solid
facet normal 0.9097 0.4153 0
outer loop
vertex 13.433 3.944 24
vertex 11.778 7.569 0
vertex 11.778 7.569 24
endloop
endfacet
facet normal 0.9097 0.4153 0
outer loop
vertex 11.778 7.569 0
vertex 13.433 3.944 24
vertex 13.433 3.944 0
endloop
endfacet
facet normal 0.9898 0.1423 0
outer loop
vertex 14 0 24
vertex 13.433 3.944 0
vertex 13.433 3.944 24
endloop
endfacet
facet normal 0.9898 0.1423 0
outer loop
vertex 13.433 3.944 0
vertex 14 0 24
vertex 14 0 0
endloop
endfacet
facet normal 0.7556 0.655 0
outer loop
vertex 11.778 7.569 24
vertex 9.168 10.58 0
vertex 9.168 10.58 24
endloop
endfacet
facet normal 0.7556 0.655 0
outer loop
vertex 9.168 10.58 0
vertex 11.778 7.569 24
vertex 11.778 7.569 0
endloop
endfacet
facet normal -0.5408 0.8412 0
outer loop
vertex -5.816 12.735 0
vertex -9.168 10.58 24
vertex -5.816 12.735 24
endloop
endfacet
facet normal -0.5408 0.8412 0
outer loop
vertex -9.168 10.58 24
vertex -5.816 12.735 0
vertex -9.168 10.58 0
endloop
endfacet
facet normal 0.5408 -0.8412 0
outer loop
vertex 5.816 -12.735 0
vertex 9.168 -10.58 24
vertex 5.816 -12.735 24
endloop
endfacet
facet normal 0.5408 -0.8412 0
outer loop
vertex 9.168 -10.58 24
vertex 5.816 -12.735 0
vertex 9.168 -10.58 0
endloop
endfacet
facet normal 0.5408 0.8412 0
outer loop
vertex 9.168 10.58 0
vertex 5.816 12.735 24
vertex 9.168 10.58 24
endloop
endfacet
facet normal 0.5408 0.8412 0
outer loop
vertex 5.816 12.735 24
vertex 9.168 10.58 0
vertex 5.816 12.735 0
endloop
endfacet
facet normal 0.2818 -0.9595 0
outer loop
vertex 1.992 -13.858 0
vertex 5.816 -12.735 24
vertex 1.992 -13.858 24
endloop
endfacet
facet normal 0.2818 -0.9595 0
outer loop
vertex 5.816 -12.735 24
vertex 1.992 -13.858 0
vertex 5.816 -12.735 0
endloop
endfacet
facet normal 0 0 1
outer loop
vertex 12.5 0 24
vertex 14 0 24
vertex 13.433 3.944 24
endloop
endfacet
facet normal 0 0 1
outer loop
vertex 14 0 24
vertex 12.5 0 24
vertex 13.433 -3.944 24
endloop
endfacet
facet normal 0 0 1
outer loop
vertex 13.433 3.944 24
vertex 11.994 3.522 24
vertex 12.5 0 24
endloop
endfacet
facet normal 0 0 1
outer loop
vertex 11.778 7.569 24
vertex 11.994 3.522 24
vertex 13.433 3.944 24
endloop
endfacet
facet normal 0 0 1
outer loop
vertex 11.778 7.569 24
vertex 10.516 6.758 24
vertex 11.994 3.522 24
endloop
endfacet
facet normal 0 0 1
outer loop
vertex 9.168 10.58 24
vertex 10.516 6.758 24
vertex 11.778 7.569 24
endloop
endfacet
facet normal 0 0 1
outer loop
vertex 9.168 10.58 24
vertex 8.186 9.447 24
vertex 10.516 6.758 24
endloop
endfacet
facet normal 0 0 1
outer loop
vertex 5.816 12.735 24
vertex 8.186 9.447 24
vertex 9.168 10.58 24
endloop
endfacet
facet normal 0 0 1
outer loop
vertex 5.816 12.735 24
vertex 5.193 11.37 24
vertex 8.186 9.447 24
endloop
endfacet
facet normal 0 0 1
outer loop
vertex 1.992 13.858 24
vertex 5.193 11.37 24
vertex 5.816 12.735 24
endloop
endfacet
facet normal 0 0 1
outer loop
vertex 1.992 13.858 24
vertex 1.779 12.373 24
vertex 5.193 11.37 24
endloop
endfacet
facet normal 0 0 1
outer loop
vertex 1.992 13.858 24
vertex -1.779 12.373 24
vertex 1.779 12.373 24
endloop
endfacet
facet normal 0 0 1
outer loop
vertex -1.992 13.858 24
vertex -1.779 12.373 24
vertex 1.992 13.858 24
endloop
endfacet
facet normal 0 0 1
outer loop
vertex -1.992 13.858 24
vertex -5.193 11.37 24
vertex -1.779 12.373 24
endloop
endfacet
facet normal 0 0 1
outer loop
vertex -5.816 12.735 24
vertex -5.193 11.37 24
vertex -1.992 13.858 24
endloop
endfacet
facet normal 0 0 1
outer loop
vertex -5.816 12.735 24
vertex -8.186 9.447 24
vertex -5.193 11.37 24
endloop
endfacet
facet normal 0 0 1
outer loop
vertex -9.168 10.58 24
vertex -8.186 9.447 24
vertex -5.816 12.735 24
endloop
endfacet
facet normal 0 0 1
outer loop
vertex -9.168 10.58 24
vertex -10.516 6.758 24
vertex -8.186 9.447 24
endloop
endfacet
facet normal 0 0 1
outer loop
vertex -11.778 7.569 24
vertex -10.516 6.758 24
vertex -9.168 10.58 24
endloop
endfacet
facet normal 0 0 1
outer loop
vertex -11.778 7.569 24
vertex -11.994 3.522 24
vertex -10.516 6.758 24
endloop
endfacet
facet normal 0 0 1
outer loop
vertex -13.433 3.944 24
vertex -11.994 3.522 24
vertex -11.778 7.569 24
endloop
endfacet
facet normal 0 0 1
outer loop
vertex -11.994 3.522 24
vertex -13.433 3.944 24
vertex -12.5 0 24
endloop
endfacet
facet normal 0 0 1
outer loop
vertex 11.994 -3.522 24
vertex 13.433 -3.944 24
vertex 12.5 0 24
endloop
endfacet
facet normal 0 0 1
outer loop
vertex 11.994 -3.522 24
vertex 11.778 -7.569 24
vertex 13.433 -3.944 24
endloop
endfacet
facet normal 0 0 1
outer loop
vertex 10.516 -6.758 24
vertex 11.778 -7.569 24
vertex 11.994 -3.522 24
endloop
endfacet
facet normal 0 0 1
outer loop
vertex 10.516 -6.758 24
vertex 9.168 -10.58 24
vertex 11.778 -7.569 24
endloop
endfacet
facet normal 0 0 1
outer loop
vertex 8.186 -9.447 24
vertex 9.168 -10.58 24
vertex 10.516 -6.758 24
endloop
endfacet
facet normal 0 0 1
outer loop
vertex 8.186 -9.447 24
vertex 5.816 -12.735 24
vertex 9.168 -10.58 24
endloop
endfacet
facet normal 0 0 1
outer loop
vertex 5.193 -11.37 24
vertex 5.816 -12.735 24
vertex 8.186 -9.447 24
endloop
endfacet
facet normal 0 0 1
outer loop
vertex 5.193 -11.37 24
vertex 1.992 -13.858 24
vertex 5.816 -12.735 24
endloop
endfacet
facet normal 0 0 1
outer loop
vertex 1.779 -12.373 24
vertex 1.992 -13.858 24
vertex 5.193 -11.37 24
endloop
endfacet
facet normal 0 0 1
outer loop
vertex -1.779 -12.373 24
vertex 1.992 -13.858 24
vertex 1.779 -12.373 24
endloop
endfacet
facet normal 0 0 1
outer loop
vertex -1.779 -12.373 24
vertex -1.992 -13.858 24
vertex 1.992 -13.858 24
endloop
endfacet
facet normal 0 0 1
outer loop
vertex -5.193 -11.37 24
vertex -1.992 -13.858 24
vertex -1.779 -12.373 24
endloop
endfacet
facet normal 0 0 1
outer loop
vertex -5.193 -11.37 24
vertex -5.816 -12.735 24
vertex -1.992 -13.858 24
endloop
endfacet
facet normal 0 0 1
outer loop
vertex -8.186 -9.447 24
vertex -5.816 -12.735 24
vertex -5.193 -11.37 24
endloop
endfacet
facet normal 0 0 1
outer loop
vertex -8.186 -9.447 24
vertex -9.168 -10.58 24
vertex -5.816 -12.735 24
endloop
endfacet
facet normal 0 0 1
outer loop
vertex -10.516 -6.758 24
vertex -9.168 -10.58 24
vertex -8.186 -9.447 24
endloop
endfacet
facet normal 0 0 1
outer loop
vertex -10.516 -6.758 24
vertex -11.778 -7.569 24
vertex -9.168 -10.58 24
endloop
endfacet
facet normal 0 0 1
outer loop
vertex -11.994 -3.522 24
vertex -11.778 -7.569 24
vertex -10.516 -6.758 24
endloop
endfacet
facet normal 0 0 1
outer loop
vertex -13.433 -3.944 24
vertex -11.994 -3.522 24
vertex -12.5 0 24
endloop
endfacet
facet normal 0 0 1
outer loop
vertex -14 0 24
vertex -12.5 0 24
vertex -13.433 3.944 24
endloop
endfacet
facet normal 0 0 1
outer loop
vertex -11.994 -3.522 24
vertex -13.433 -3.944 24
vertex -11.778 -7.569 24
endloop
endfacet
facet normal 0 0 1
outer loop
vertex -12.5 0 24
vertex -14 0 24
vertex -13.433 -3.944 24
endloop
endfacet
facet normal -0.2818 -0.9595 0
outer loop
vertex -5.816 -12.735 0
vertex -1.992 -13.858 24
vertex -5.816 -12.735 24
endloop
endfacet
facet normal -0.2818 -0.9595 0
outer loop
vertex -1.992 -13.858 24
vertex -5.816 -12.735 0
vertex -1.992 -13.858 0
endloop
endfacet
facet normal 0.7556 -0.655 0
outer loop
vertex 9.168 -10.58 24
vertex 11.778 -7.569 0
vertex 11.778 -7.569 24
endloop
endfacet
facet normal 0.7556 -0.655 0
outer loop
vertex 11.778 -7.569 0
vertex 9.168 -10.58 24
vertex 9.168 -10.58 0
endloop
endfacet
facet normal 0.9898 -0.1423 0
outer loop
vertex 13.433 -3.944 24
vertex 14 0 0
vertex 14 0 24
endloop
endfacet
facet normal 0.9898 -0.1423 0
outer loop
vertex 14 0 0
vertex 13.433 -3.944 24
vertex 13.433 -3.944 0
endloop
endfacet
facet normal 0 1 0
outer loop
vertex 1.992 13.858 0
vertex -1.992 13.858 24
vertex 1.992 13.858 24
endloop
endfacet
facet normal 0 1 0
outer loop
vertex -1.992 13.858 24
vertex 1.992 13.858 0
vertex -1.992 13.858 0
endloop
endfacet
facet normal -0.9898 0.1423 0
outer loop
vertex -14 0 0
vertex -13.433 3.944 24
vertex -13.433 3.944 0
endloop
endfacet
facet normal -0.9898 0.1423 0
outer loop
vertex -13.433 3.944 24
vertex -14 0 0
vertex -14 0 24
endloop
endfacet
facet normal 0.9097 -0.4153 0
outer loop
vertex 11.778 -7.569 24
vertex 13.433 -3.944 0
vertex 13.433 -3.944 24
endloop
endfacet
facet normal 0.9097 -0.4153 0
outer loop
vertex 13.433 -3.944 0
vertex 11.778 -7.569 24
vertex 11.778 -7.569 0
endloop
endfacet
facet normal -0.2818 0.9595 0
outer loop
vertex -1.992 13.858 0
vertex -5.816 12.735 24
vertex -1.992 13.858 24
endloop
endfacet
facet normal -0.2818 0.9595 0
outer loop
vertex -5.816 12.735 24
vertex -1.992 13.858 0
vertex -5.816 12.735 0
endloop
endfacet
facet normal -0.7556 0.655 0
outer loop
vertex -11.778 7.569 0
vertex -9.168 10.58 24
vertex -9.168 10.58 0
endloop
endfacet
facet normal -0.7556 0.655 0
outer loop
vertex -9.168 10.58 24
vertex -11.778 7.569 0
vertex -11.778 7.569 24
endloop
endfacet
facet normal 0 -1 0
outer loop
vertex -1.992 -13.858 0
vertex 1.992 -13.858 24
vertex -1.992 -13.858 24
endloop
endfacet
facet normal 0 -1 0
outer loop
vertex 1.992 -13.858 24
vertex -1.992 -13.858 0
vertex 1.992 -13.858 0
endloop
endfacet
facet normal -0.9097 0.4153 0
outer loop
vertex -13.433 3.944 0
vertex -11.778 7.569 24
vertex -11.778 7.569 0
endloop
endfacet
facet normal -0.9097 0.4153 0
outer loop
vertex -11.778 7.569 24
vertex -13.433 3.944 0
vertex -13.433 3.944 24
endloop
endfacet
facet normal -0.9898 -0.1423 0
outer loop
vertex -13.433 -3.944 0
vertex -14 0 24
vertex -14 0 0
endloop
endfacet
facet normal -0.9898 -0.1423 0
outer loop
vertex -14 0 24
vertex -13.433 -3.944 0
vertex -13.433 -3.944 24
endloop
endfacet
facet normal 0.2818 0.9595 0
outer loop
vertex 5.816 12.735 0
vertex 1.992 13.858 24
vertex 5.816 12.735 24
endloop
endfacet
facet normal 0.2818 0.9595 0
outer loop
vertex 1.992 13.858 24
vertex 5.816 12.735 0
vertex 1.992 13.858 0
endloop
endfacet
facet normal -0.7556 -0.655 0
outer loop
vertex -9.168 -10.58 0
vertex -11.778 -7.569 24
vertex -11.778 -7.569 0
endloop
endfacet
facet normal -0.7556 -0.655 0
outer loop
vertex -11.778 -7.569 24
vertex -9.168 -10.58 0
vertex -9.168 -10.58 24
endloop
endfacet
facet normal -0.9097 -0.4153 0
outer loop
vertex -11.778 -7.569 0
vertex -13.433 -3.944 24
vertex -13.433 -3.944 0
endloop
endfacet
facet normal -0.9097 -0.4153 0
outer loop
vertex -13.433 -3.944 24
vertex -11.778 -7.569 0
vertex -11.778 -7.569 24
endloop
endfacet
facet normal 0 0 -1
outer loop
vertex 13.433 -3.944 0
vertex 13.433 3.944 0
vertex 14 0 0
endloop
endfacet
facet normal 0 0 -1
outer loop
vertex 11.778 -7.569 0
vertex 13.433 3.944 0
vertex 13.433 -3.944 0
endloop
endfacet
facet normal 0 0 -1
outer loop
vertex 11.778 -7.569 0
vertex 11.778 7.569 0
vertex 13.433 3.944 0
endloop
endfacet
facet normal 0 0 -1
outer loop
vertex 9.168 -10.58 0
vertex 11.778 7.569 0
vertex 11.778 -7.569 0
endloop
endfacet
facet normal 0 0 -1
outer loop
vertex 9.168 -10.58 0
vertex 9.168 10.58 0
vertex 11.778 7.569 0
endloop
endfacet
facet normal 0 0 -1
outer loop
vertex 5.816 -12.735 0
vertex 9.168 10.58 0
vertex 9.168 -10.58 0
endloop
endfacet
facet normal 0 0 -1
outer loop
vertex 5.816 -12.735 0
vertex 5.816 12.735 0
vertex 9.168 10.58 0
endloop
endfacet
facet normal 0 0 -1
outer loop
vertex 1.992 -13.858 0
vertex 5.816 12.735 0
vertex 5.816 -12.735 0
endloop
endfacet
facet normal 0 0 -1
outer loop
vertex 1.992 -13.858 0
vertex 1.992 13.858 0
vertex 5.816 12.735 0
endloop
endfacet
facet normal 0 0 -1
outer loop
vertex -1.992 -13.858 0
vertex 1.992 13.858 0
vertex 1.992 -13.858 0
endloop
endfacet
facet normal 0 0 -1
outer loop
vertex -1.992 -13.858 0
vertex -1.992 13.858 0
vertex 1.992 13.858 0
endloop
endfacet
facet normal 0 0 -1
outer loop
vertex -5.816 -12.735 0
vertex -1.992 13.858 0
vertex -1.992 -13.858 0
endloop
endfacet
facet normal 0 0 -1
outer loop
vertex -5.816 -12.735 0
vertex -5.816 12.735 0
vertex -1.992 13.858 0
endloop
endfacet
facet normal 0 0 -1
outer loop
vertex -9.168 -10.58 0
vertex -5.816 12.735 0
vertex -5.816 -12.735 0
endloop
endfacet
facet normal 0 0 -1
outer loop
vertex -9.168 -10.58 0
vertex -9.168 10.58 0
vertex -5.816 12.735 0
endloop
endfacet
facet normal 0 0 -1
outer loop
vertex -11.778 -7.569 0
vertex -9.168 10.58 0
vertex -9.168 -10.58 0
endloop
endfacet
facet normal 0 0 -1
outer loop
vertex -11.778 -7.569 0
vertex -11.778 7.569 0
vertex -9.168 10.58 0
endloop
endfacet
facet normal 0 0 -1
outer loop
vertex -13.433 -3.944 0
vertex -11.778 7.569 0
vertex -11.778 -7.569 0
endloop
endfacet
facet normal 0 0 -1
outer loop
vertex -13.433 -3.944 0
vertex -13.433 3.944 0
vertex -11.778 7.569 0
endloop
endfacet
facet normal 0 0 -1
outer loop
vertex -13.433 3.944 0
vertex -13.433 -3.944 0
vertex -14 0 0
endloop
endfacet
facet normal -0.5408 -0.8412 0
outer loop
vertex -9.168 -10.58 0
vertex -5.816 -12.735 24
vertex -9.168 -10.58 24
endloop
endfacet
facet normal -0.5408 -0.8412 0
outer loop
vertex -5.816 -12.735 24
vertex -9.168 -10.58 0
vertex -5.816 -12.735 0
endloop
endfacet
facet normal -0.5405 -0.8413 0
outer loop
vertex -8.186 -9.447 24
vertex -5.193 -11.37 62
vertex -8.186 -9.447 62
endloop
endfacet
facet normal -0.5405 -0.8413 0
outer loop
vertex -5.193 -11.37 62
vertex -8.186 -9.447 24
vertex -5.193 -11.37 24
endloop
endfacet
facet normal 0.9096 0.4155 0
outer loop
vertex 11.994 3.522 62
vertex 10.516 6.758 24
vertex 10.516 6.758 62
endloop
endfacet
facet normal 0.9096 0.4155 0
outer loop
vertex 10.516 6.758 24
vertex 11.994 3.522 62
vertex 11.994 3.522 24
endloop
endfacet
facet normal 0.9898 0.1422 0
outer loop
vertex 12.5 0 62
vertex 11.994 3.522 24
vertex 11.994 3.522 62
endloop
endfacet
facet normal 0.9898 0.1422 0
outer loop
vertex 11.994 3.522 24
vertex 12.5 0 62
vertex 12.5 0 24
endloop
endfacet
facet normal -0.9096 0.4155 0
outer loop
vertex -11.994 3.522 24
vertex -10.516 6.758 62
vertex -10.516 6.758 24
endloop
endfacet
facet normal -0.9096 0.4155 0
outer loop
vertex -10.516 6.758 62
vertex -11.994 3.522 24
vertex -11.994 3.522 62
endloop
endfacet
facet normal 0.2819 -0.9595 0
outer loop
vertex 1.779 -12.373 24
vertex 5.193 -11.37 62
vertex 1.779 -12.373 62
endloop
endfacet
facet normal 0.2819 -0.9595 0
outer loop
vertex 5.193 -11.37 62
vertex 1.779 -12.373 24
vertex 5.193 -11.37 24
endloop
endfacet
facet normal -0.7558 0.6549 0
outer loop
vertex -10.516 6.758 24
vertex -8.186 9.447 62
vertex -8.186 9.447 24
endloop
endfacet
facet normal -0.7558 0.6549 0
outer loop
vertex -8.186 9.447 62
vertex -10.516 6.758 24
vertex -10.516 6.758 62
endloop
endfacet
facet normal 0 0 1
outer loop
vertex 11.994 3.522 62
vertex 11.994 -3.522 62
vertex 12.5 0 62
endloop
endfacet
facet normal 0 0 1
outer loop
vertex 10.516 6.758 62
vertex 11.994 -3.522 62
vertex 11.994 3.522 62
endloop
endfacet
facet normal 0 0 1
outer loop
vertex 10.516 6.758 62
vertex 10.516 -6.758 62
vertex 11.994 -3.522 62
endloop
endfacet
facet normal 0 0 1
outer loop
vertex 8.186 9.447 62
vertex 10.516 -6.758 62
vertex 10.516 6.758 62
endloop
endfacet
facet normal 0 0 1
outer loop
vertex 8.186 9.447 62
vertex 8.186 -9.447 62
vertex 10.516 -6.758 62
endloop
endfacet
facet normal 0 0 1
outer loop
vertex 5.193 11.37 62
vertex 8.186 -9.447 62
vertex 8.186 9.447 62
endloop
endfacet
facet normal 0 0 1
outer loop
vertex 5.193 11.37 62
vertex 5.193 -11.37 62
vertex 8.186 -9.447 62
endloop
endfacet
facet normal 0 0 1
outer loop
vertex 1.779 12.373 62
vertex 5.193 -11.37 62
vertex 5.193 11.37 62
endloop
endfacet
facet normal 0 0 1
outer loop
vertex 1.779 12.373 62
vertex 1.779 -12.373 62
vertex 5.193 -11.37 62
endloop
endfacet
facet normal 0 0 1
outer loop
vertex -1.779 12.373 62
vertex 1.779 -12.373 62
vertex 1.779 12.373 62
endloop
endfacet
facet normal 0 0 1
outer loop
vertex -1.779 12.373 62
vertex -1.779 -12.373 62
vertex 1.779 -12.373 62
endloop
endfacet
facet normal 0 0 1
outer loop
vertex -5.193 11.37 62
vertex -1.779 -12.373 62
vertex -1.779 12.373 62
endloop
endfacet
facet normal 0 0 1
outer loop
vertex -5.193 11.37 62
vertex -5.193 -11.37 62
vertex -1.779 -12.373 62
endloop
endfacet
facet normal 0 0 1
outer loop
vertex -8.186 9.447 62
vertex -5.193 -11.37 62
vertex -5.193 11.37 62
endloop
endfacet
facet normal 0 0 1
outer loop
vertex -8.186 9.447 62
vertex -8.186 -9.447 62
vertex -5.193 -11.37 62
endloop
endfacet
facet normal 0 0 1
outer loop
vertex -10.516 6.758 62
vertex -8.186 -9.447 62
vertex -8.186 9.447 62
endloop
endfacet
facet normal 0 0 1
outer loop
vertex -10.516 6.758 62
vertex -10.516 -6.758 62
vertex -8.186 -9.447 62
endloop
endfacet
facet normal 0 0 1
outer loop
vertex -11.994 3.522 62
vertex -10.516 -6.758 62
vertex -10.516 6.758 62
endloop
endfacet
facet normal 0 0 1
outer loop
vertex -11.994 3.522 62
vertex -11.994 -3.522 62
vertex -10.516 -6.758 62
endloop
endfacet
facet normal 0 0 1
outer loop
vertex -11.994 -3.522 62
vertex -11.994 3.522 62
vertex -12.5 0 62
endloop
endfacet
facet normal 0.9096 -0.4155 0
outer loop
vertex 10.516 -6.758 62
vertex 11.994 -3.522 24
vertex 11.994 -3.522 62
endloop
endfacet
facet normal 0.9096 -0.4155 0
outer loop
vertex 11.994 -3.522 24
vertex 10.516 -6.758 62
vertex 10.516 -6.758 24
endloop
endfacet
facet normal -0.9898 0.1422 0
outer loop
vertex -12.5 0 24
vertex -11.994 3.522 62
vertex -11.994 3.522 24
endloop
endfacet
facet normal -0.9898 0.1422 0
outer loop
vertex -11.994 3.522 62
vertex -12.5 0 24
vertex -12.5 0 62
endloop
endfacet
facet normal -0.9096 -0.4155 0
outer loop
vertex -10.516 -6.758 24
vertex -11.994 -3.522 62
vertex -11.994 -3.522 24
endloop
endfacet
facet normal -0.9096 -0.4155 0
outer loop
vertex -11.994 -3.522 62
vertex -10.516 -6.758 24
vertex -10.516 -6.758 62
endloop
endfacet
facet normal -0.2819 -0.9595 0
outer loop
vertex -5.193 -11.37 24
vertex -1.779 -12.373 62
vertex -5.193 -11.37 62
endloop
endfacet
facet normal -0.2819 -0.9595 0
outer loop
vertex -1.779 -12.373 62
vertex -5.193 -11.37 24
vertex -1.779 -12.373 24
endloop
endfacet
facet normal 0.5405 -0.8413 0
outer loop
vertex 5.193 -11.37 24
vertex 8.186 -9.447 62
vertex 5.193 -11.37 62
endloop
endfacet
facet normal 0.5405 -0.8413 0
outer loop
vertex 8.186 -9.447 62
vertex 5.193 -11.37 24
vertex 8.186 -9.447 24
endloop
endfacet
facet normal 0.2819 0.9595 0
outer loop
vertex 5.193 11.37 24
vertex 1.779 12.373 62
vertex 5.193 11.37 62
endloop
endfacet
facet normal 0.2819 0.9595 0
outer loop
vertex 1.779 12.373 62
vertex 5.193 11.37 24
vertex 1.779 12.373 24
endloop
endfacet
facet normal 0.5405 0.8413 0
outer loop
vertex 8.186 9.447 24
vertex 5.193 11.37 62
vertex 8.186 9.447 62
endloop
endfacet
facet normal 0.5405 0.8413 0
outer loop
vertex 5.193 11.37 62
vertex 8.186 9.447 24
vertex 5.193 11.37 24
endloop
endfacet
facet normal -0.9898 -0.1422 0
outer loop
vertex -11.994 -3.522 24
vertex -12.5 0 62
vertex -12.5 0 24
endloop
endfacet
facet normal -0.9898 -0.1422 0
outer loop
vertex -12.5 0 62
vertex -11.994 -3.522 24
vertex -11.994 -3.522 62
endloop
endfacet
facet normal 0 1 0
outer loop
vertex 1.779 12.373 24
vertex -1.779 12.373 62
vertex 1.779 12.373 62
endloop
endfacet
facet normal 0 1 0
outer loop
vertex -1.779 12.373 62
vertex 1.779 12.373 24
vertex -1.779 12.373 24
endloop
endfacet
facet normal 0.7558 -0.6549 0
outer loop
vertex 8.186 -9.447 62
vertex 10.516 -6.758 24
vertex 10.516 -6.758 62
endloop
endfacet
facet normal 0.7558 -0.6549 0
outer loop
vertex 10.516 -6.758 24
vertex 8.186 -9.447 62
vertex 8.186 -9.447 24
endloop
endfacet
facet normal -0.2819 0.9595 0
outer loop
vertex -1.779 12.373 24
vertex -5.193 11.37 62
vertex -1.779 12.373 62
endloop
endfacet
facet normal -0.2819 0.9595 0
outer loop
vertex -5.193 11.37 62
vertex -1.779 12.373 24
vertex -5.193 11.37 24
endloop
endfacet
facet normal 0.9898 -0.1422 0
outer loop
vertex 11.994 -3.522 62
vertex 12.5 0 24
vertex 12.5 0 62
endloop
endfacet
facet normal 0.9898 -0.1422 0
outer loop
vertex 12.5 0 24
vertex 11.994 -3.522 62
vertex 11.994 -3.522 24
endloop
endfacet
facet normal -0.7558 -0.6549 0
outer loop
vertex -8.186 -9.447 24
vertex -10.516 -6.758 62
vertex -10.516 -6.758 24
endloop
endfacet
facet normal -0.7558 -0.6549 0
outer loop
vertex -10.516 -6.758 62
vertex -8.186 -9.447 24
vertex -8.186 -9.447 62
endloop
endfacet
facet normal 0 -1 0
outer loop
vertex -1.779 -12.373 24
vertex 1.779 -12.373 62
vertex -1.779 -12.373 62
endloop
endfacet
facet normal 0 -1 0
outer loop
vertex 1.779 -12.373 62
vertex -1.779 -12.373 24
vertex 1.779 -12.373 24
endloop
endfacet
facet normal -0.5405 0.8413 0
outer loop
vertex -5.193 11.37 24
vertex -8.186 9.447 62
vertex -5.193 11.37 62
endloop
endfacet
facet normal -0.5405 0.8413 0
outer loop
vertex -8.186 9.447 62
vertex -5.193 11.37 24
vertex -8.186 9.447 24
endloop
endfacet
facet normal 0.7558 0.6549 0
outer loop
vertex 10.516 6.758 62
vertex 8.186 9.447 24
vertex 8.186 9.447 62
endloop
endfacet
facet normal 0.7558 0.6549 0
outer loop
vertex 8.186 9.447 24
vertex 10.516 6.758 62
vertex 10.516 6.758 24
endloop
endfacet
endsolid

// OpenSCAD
module waterdispenser()
{
    holder_diam = 28;
    holder_h = 24;
    bottle_diam = 25;
    bottle_h = 38;
    
    // translate([0, 0, pipe_length/2])
    color([0.9,0.9,0.9, 1.0])
    cylinder(h=holder_h,d=holder_diam, $fn = 22);

    color([0.23,0.12,0.90, 0.7])
    cylinder(h=holder_h+bottle_h,d=bottle_diam, $fn = 22);
}   

waterdispenser();
